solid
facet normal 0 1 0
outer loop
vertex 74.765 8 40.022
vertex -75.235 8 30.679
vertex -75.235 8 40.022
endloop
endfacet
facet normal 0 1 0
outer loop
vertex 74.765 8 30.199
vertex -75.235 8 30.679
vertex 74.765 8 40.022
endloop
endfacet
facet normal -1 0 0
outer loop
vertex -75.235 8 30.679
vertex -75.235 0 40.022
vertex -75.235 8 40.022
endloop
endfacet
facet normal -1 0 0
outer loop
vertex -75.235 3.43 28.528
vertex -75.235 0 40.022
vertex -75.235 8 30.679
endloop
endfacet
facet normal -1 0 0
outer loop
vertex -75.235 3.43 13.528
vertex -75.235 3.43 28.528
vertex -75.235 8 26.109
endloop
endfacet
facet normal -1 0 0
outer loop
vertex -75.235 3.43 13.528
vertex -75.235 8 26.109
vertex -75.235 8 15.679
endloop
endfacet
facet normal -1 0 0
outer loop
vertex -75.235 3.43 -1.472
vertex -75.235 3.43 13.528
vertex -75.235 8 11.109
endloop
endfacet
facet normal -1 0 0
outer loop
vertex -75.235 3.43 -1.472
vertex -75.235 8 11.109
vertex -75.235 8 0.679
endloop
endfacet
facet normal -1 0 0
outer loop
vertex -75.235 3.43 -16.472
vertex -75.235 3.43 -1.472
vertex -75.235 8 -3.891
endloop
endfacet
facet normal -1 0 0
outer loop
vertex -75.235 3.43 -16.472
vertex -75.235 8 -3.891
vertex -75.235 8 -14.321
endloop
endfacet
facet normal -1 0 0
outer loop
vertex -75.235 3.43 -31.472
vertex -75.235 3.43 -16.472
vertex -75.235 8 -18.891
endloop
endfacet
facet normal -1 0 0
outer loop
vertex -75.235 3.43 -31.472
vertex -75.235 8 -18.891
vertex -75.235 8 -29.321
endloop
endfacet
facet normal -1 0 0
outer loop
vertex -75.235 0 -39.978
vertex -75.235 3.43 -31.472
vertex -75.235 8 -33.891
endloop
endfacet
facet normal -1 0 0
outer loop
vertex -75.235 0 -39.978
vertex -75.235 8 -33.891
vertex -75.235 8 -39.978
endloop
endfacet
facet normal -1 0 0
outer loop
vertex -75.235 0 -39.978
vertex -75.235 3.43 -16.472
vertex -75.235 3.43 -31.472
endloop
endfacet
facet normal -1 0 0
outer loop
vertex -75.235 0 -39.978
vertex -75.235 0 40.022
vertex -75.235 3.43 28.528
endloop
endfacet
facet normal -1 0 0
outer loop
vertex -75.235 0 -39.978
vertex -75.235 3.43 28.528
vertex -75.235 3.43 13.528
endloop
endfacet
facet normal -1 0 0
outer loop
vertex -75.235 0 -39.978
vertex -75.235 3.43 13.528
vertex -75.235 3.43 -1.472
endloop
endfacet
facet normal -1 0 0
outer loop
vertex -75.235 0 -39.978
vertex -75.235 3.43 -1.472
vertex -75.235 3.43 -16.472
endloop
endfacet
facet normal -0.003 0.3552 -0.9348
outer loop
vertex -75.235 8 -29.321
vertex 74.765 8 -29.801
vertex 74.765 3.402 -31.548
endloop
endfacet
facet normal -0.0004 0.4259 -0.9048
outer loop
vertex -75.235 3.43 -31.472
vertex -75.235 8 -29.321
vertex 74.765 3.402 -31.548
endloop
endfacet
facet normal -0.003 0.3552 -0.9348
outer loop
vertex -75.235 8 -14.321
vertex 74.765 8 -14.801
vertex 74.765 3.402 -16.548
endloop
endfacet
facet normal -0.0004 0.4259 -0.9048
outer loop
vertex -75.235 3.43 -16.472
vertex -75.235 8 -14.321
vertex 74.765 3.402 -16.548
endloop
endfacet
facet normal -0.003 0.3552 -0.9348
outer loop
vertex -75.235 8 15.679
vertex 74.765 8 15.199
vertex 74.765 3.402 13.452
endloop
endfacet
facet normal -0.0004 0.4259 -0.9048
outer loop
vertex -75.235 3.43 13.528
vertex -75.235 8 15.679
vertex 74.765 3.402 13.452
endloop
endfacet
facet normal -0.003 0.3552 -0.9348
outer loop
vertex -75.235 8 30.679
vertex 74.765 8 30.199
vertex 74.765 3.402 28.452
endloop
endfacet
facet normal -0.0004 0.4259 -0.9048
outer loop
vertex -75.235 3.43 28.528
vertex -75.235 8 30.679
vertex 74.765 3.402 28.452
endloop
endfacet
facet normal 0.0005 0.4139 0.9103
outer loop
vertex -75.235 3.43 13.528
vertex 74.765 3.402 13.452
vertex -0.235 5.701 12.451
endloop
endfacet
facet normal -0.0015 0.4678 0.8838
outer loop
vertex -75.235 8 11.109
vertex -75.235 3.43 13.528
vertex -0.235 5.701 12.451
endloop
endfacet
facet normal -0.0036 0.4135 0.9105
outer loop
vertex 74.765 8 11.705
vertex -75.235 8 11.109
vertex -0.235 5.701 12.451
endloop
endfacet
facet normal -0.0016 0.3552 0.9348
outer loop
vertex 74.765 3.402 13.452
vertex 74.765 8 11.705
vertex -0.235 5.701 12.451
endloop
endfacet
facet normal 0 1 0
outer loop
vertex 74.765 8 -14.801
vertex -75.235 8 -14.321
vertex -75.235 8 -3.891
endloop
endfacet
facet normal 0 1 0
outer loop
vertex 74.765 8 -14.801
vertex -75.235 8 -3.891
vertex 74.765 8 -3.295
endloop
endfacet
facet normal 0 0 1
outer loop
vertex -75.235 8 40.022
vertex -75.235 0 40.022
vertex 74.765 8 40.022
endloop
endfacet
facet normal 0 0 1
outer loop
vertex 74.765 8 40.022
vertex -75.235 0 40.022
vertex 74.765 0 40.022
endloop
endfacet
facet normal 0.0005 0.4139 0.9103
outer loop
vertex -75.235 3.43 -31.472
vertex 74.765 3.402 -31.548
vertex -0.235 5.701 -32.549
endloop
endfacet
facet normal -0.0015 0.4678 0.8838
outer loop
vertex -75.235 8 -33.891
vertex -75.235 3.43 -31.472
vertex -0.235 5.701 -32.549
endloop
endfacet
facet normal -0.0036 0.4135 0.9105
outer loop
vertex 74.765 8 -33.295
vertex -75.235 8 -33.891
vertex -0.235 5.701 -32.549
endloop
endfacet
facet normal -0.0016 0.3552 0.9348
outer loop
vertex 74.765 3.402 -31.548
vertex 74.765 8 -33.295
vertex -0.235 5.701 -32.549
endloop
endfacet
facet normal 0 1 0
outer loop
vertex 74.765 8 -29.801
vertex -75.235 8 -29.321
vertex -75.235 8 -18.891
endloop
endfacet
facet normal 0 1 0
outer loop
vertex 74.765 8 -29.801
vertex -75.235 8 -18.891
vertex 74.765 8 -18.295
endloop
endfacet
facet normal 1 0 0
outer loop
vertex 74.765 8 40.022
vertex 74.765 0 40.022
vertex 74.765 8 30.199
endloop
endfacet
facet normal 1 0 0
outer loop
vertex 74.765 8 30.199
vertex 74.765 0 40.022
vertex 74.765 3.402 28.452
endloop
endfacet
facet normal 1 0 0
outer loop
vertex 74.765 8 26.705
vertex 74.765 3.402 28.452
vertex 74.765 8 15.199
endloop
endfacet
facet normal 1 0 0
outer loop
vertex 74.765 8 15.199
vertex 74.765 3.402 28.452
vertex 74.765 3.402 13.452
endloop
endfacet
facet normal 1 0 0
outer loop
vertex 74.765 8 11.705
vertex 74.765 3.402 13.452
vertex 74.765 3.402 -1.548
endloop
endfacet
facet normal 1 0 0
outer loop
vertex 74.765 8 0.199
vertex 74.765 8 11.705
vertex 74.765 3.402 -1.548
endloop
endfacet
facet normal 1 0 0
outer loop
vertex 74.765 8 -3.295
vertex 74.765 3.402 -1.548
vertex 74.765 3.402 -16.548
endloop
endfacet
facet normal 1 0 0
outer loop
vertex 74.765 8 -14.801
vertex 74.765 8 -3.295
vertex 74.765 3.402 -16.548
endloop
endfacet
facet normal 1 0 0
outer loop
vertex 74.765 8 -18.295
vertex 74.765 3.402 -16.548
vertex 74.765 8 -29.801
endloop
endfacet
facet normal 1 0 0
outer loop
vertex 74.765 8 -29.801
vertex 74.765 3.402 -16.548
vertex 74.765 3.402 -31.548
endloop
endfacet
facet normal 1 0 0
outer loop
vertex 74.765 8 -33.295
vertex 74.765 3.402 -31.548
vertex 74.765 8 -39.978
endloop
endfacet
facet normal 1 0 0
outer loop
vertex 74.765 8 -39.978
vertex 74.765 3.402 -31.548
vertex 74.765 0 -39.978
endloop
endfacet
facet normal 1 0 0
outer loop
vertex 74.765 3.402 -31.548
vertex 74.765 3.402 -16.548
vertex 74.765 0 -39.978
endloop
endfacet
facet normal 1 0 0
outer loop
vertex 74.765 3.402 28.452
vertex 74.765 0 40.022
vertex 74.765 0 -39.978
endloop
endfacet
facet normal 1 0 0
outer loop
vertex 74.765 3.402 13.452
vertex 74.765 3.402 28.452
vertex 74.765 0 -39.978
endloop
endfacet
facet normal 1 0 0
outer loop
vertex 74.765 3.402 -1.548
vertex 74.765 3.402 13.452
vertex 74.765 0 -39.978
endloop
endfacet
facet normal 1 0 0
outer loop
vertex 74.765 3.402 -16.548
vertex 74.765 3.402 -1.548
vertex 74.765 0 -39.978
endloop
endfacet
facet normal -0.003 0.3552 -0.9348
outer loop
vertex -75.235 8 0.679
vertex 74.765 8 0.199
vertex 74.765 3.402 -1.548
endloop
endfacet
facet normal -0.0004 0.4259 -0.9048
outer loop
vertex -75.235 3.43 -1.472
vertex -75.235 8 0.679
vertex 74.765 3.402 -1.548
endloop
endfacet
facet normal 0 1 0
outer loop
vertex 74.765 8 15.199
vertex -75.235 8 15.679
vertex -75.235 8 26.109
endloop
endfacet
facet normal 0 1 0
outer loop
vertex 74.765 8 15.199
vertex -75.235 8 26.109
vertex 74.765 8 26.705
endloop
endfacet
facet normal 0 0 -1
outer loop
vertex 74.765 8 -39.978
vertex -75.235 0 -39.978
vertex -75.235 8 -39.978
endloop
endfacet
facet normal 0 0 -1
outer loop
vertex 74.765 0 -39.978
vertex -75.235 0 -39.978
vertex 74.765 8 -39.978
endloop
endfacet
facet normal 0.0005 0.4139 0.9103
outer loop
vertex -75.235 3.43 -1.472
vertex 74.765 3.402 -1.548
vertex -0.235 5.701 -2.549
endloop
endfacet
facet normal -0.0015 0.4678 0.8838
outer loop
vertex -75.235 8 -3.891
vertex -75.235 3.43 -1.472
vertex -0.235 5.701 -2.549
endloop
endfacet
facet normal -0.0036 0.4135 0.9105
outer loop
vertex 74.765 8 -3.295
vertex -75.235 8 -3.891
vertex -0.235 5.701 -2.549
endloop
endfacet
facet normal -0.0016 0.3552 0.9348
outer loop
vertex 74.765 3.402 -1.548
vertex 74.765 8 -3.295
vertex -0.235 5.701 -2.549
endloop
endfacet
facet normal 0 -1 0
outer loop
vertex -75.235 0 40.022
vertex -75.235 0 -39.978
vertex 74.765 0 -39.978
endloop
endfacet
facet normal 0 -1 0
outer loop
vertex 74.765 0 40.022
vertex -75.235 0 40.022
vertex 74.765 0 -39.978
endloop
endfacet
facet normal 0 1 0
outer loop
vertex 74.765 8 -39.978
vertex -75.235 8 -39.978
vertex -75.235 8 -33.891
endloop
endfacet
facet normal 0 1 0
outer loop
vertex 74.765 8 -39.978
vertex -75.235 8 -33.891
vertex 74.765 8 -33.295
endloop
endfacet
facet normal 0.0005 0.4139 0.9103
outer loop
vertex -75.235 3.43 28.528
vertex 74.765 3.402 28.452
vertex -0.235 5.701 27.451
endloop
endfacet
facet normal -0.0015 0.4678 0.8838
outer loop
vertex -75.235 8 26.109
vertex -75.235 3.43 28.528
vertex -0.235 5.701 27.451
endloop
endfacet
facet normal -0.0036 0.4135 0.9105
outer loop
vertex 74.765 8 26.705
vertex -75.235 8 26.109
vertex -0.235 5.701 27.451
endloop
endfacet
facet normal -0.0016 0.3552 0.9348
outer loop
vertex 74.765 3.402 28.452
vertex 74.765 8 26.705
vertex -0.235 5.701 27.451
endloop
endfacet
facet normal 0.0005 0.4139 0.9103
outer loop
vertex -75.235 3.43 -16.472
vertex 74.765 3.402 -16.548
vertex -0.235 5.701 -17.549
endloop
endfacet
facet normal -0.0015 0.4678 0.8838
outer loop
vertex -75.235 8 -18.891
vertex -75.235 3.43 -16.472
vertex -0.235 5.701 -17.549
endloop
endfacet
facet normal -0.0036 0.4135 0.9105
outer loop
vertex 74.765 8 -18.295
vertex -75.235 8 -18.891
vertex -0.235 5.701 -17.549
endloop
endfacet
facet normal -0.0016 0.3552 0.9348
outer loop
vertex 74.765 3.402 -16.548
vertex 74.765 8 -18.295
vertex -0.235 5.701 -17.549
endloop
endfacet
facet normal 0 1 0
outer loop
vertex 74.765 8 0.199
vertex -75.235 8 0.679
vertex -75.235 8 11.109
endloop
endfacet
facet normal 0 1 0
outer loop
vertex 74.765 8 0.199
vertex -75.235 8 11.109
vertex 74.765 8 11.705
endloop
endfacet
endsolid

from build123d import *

# Parameters (mm, degrees)
SKETCH_1_W             = 150
SKETCH_1_H             = 80
EXTRUDE_1_DEPTH        = 8
PATTERN_LINEAR_1_COUNT = 5
PATTERN_LINEAR_1_PITCH = 15


with BuildPart() as part:
    # 草图1 → 凸台-拉伸1 (new body)
    with BuildSketch(Plane(origin=(0, 0, 0), x_dir=(1, 0, 0), z_dir=(0, 1, 0))):
        with Locations((-0.235062575, -0.022221524)):
            Rectangle(SKETCH_1_W, SKETCH_1_H)
    extrude(amount=EXTRUDE_1_DEPTH)

    # 草图7 → 切除-放样1 section 0
    with BuildSketch(Plane.ZY.offset(75.235062575)):
        with BuildLine():
            Line((-34.118346575, 8.429877802), (-29.118346575, 8.429877802))
            Line((-29.118346575, 8.429877802), (-31.471533702, 3.429877802))
            Line((-31.471533702, 3.429877802), (-34.118346575, 8.429877802))
        make_face()
    # 草图15 → 切除-放样1 section 1
    with BuildSketch(Plane.ZY.offset(-74.764937425)):
        with BuildLine():
            Line((-33.447855692, 8.401766208), (-29.647855692, 8.401766208))
            Line((-29.647855692, 8.401766208), (-31.547855692, 3.401766208))
            Line((-31.547855692, 3.401766208), (-33.447855692, 8.401766208))
        make_face()
    loft_1 = loft(mode=Mode.SUBTRACT)

    # 阵列(线性)1: 切除-放样1 ×5
    with Locations(*[(0, 0, i * PATTERN_LINEAR_1_PITCH) for i in range(1, PATTERN_LINEAR_1_COUNT)]):
        add(loft_1, mode=Mode.SUBTRACT)


solid = part.part
